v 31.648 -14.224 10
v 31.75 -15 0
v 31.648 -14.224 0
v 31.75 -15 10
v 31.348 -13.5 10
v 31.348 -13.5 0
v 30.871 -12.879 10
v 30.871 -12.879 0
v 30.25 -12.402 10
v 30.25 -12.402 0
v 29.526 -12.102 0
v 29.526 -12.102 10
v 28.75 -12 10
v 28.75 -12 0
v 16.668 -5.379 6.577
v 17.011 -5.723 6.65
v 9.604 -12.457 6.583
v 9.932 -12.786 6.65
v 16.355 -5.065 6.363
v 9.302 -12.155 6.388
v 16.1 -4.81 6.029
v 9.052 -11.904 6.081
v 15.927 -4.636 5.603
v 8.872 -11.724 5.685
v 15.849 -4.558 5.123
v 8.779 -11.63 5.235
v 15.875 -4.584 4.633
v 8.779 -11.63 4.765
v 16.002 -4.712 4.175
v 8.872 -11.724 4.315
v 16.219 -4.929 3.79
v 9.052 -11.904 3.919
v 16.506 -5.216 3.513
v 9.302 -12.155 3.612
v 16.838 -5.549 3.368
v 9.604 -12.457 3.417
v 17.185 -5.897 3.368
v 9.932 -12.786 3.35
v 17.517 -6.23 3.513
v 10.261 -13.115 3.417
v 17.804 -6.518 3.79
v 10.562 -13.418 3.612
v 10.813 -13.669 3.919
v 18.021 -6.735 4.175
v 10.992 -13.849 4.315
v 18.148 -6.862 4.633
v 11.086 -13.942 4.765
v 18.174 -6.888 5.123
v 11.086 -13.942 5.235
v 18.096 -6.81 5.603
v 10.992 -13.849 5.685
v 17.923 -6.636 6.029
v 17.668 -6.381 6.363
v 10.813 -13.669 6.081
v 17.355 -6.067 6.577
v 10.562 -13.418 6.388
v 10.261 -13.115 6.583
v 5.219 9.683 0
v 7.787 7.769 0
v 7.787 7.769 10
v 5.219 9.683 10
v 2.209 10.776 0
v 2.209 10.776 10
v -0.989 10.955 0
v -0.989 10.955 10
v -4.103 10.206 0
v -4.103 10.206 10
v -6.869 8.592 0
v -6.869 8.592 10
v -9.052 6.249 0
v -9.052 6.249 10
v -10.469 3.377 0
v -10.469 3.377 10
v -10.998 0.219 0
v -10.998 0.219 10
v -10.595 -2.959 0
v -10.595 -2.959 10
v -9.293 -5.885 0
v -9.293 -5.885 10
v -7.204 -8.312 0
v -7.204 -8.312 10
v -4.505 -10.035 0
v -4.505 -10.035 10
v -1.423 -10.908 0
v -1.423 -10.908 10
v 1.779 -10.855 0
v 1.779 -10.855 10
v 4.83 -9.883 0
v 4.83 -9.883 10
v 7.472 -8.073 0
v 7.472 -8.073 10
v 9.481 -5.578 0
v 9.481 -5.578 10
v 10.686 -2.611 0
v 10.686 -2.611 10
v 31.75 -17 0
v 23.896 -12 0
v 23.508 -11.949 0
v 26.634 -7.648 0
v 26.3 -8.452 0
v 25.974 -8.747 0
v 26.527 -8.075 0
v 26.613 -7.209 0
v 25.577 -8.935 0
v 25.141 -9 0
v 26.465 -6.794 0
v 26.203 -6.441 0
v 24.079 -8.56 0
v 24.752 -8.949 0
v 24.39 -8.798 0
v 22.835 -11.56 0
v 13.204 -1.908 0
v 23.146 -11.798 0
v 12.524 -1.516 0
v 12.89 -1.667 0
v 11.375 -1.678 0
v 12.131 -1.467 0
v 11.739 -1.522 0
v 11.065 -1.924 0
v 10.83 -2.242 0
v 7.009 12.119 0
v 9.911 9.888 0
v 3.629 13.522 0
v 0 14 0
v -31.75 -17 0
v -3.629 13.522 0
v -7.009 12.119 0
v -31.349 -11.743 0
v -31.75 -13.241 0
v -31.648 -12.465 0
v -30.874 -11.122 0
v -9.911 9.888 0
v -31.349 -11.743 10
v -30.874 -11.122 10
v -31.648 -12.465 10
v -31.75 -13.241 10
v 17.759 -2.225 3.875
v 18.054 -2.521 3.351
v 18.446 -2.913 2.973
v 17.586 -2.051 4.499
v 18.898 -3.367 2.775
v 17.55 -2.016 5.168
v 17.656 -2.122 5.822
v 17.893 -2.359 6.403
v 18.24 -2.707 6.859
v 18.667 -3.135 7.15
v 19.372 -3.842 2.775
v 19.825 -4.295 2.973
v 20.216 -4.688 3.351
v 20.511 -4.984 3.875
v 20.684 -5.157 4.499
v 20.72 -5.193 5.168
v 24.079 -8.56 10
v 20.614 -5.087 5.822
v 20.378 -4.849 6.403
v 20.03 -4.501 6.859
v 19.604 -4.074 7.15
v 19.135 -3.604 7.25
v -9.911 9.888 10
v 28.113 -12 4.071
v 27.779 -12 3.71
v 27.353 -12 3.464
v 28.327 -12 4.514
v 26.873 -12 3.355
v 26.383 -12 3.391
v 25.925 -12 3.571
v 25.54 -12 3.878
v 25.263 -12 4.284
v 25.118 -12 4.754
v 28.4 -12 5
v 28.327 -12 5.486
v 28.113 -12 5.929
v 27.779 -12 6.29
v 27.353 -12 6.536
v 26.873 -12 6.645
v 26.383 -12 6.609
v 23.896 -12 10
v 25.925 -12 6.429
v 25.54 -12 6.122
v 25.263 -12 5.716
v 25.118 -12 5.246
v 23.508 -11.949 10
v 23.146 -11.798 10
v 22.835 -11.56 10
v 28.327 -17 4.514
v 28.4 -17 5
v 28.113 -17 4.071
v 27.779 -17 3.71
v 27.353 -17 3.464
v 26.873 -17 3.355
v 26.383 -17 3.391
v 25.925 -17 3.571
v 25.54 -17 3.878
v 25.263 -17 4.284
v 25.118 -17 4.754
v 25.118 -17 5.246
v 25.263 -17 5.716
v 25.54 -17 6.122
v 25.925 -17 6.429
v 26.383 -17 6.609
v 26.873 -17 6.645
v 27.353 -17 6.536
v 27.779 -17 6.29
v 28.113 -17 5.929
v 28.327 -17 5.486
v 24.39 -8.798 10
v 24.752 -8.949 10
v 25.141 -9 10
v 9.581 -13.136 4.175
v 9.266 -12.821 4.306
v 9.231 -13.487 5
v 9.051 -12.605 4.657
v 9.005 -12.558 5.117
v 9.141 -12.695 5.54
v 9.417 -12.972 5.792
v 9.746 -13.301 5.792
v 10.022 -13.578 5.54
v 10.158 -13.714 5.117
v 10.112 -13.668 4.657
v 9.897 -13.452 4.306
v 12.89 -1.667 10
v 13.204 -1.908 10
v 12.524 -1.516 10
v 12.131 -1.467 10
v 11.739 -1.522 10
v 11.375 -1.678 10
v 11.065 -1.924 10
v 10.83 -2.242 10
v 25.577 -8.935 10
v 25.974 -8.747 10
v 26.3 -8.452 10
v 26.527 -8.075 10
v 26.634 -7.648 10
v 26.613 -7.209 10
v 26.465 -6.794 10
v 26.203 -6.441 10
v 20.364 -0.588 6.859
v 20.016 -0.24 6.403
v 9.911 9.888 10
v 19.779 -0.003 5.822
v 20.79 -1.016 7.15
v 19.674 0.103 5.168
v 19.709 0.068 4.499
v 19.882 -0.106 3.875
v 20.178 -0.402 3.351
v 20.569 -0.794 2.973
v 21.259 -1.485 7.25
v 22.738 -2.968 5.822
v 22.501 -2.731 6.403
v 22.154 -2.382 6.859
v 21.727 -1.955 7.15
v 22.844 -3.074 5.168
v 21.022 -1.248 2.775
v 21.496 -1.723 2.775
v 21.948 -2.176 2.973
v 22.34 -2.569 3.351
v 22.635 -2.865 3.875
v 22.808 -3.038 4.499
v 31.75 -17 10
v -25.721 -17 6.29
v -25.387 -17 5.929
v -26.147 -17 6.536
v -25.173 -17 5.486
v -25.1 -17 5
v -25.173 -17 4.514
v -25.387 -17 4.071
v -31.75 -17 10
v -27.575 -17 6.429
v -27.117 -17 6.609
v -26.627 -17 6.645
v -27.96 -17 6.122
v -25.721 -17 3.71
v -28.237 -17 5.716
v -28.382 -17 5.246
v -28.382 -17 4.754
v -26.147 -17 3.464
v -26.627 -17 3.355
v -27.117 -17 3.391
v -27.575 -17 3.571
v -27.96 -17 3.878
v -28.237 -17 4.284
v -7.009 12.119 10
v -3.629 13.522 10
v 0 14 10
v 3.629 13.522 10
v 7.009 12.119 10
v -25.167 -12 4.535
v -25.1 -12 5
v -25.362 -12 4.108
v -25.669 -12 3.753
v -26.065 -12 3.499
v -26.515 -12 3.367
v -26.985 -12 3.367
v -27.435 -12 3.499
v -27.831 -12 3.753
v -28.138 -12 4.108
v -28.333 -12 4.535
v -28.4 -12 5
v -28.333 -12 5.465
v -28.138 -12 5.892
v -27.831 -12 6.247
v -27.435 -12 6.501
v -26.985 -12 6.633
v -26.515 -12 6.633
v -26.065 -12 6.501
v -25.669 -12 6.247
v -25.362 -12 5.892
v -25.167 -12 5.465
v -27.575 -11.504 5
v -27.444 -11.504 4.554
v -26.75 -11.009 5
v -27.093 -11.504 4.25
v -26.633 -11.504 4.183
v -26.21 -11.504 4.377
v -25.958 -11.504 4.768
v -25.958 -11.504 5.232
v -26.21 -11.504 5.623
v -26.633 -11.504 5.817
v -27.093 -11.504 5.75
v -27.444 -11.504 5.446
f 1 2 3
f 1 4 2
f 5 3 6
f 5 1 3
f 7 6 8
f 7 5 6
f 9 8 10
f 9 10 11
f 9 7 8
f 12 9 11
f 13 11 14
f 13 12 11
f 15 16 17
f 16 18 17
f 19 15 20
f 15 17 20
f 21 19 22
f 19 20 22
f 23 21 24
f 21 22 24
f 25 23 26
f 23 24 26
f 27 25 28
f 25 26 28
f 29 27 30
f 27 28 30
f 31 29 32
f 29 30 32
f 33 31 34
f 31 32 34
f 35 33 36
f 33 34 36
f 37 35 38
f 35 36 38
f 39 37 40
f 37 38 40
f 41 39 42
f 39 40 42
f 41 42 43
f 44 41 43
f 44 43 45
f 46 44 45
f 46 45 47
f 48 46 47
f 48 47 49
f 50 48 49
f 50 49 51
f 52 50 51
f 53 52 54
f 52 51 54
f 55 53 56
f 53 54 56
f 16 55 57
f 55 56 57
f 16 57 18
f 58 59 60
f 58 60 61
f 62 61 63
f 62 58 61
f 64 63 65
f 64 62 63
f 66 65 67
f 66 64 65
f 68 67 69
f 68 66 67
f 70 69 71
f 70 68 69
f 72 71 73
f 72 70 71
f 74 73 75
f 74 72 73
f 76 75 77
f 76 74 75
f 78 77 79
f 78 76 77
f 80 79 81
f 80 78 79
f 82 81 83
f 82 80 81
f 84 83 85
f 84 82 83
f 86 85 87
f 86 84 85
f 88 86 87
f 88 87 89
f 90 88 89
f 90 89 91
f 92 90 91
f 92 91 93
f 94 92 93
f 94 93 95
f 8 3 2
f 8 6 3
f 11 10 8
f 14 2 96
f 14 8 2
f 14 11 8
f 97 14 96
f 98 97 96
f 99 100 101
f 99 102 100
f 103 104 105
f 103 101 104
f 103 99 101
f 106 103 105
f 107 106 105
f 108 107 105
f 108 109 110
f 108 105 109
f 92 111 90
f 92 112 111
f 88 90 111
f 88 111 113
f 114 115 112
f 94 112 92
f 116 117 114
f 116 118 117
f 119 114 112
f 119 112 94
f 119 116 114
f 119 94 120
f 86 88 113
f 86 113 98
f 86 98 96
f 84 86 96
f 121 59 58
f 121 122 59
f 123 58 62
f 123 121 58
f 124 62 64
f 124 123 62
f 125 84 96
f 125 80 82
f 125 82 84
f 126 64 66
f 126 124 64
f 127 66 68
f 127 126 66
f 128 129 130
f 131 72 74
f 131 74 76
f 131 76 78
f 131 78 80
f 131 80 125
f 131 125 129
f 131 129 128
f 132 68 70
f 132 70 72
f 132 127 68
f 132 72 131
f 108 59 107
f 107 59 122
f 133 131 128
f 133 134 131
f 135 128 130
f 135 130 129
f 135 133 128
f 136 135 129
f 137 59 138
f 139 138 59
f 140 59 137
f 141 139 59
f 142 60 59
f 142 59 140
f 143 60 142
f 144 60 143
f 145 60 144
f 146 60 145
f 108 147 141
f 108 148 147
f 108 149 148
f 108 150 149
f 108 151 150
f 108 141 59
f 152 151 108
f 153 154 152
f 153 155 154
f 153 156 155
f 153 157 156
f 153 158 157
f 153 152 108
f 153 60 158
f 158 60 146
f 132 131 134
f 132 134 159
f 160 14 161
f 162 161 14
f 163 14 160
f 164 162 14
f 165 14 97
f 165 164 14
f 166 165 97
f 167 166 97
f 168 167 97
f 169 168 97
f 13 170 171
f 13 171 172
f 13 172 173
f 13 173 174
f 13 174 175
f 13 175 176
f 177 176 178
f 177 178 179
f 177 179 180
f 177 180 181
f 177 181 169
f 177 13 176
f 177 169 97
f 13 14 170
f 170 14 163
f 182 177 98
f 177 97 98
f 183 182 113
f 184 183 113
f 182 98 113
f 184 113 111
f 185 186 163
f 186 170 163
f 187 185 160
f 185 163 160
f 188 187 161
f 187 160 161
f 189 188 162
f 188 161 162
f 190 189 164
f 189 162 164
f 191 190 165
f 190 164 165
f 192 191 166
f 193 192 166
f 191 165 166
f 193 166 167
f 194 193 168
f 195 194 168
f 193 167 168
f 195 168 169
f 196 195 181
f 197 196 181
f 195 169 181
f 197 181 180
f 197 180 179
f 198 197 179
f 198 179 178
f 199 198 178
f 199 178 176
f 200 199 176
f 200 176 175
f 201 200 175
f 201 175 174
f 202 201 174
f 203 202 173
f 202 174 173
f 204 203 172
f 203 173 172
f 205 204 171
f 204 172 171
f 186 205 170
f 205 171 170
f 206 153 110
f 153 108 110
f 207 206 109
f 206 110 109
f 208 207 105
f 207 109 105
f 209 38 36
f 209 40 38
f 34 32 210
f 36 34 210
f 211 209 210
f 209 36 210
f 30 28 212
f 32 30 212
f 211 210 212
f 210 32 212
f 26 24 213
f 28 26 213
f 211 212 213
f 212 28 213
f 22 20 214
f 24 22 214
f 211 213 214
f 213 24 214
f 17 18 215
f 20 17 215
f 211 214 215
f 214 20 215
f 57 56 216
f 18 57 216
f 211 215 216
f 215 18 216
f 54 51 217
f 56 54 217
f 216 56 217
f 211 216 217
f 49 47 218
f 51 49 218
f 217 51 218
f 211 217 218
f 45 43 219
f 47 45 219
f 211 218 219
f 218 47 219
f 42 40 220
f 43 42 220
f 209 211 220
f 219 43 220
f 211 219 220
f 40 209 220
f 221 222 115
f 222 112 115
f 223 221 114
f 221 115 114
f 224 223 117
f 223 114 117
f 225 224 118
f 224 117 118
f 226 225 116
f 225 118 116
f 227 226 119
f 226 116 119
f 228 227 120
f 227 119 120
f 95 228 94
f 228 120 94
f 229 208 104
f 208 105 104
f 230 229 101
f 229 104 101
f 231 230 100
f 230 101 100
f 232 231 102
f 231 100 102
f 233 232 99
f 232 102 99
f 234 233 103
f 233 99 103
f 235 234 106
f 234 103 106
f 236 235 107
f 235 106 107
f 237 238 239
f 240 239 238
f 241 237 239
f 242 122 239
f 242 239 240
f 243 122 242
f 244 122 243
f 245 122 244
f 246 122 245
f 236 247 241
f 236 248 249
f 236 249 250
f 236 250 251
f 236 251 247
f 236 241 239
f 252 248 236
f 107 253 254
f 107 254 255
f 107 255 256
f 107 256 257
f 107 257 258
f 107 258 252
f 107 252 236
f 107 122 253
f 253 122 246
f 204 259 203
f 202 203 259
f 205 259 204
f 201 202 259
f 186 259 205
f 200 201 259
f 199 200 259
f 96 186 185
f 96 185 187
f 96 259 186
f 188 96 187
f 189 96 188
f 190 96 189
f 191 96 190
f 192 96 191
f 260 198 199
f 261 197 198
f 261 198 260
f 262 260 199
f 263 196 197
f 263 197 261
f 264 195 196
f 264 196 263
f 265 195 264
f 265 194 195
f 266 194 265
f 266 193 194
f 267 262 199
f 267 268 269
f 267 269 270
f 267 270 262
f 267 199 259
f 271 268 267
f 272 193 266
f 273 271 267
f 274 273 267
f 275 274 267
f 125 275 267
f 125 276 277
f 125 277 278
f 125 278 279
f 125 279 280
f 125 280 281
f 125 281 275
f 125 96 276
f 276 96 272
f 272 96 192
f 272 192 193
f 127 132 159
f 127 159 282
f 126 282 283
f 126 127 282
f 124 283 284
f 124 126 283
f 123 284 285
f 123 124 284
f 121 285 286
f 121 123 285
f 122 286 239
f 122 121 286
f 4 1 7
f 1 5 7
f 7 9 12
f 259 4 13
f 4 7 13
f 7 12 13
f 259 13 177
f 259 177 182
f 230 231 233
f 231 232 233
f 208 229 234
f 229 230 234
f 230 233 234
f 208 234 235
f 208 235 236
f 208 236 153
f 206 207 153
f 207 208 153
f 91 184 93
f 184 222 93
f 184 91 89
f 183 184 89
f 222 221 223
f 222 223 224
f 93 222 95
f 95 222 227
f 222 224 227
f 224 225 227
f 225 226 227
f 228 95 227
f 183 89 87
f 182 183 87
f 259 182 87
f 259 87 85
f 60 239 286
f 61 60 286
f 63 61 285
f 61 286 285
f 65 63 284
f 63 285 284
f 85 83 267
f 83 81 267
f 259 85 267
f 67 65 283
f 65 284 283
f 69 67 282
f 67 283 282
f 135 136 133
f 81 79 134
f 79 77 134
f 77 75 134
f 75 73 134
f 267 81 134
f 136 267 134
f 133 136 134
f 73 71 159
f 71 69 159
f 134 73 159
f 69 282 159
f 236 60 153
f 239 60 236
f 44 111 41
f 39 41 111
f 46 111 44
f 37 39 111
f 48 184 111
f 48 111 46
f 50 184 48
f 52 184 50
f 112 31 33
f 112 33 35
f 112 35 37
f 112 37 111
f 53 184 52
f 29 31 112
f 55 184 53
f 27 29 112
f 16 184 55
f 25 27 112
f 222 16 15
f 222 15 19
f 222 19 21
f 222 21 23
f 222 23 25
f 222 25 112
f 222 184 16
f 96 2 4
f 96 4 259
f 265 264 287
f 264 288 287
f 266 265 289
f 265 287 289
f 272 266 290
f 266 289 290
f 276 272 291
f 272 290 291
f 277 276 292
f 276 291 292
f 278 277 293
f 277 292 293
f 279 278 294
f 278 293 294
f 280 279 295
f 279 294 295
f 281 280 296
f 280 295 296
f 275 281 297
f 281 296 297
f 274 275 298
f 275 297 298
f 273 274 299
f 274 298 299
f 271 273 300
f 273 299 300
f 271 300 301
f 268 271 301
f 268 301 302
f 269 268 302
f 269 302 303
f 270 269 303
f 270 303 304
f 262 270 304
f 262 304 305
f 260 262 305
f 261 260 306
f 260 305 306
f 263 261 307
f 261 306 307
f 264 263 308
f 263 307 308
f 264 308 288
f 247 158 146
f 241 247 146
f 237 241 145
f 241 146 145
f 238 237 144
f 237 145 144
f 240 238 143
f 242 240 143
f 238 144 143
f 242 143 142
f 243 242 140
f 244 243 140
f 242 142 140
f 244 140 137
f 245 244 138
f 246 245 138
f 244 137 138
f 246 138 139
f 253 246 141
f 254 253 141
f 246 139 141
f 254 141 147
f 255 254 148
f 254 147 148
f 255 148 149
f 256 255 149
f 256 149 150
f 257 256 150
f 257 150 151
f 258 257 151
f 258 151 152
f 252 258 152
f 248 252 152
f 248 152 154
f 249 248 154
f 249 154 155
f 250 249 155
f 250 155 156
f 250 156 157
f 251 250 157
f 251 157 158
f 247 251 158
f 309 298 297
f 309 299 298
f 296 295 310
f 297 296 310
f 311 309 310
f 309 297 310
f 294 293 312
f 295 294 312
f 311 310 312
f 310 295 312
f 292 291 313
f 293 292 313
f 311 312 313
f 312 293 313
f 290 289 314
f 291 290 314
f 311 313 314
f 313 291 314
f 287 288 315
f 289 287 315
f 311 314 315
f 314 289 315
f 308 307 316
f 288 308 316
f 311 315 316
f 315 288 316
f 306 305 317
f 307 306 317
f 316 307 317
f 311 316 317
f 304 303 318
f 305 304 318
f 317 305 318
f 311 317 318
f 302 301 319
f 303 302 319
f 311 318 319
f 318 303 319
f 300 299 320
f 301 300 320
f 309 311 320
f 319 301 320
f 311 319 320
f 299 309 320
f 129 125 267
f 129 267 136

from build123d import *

# Parameters (mm, degrees)
SKETCH_1_R            = 11
EXTRUDE_1_DEPTH       = 10
CUT_EXTRUDE_1_DEPTH   = 38.37729926
FILLET_1_R            = 1.5
M4X0_71_D             = 3.3
M4X0_71_DEPTH         = 5
M4X0_71_TIP           = 0.991420021
HOLE_WIZARD_M41_D     = 4.5
HOLE_WIZARD_M41_DEPTH = 3
M4X0_72_D             = 3.3
M4X0_72_DEPTH         = 10
M4X0_72_TIP           = 0.991420021
FILLET_2_R            = 3


with BuildPart() as part:
    # Эскиз1 → Бобышка-Вытянуть1 (new body)
    with BuildSketch(Plane.XY):
        with BuildLine():
            Line((-31.75, -12), (-9.910576673, 9.888400781))
            ThreePointArc((-9.910576673, 9.888400781), (0, 14), (9.910576673, 9.888400781))
            Line((9.910576673, 9.888400781), (31.75, -12))
            Line((31.75, -12), (31.75, -17))
            Line((31.75, -17), (-31.75, -17))
            Line((-31.75, -17), (-31.75, -12))
        make_face()
        Circle(SKETCH_1_R, mode=Mode.SUBTRACT)
    extrude(amount=EXTRUDE_1_DEPTH)

    # Эскиз2 → Вырез-Вытянуть1 (cut, through all)
    with BuildSketch(Plane.XY.offset(10)):
        Polygon((7.786881672, 7.769457757), (24.518816114, -9), (31.75, -9), (31.75, -12), (23.274206636, -12), (10.995743008, 0.305999515), align=None)
    extrude(amount=-CUT_EXTRUDE_1_DEPTH, mode=Mode.SUBTRACT)

    # Скругление1
    fillet_1_edges = [part.edges().sort_by_distance(p)[0] for p in [
        (23.274206636, -12, 5),
        (24.518816114, -9, 5),
        (28.756712796, -9, 5),
        (10.995743008, 0.305999515, 5),
    ]]
    fillet(fillet_1_edges, radius=FILLET_1_R - 0.0001)  # a hair under: the kernel refuses the full size

    # Отверстие обработанное метчиком M4x0.71
    with Locations(Plane(origin=(0, -17, 0), x_dir=(-1, 0, 0), z_dir=(0, -1, 0))):
        with Locations((26.75, -5), (-26.75, -5)):
            Hole(M4X0_71_D / 2, depth=M4X0_71_DEPTH)
            with Locations((0, 0, -(M4X0_71_DEPTH + M4X0_71_TIP / 2))):  # 118° drill point
                Cone(0, M4X0_71_D / 2, M4X0_71_TIP, mode=Mode.SUBTRACT)

    # Отверстие с зазором M41
    with Locations(Plane(origin=(9.910576673, 9.888400781, 0), x_dir=(0, 0, -1), z_dir=(0.7078983337955254, 0.7063143415006656, 0))):
        with Locations((-5, -16.066771723)):
            Hole(HOLE_WIZARD_M41_D / 2, depth=HOLE_WIZARD_M41_DEPTH)

    # Отверстие обработанное метчиком M4x0.72
    with Locations(Plane(origin=(5.66318667, 5.650514732, 0), x_dir=(0, 0, -1), z_dir=(0.7078983337955258, 0.7063143415006653, 0))):
        with Locations((-5, -16.066771723)):
            Hole(M4X0_72_D / 2, depth=M4X0_72_DEPTH)
            with Locations((0, 0, -(M4X0_72_DEPTH + M4X0_72_TIP / 2))):  # 118° drill point
                Cone(0, M4X0_72_D / 2, M4X0_72_TIP, mode=Mode.SUBTRACT)

    # Скругление2
    fillet_2_edges = [part.edges().sort_by_distance(p)[0] for p in [
        (-31.75, -12, 5),
        (31.75, -12, 5),
    ]]
    fillet(fillet_2_edges, radius=FILLET_2_R)


solid = part.part
